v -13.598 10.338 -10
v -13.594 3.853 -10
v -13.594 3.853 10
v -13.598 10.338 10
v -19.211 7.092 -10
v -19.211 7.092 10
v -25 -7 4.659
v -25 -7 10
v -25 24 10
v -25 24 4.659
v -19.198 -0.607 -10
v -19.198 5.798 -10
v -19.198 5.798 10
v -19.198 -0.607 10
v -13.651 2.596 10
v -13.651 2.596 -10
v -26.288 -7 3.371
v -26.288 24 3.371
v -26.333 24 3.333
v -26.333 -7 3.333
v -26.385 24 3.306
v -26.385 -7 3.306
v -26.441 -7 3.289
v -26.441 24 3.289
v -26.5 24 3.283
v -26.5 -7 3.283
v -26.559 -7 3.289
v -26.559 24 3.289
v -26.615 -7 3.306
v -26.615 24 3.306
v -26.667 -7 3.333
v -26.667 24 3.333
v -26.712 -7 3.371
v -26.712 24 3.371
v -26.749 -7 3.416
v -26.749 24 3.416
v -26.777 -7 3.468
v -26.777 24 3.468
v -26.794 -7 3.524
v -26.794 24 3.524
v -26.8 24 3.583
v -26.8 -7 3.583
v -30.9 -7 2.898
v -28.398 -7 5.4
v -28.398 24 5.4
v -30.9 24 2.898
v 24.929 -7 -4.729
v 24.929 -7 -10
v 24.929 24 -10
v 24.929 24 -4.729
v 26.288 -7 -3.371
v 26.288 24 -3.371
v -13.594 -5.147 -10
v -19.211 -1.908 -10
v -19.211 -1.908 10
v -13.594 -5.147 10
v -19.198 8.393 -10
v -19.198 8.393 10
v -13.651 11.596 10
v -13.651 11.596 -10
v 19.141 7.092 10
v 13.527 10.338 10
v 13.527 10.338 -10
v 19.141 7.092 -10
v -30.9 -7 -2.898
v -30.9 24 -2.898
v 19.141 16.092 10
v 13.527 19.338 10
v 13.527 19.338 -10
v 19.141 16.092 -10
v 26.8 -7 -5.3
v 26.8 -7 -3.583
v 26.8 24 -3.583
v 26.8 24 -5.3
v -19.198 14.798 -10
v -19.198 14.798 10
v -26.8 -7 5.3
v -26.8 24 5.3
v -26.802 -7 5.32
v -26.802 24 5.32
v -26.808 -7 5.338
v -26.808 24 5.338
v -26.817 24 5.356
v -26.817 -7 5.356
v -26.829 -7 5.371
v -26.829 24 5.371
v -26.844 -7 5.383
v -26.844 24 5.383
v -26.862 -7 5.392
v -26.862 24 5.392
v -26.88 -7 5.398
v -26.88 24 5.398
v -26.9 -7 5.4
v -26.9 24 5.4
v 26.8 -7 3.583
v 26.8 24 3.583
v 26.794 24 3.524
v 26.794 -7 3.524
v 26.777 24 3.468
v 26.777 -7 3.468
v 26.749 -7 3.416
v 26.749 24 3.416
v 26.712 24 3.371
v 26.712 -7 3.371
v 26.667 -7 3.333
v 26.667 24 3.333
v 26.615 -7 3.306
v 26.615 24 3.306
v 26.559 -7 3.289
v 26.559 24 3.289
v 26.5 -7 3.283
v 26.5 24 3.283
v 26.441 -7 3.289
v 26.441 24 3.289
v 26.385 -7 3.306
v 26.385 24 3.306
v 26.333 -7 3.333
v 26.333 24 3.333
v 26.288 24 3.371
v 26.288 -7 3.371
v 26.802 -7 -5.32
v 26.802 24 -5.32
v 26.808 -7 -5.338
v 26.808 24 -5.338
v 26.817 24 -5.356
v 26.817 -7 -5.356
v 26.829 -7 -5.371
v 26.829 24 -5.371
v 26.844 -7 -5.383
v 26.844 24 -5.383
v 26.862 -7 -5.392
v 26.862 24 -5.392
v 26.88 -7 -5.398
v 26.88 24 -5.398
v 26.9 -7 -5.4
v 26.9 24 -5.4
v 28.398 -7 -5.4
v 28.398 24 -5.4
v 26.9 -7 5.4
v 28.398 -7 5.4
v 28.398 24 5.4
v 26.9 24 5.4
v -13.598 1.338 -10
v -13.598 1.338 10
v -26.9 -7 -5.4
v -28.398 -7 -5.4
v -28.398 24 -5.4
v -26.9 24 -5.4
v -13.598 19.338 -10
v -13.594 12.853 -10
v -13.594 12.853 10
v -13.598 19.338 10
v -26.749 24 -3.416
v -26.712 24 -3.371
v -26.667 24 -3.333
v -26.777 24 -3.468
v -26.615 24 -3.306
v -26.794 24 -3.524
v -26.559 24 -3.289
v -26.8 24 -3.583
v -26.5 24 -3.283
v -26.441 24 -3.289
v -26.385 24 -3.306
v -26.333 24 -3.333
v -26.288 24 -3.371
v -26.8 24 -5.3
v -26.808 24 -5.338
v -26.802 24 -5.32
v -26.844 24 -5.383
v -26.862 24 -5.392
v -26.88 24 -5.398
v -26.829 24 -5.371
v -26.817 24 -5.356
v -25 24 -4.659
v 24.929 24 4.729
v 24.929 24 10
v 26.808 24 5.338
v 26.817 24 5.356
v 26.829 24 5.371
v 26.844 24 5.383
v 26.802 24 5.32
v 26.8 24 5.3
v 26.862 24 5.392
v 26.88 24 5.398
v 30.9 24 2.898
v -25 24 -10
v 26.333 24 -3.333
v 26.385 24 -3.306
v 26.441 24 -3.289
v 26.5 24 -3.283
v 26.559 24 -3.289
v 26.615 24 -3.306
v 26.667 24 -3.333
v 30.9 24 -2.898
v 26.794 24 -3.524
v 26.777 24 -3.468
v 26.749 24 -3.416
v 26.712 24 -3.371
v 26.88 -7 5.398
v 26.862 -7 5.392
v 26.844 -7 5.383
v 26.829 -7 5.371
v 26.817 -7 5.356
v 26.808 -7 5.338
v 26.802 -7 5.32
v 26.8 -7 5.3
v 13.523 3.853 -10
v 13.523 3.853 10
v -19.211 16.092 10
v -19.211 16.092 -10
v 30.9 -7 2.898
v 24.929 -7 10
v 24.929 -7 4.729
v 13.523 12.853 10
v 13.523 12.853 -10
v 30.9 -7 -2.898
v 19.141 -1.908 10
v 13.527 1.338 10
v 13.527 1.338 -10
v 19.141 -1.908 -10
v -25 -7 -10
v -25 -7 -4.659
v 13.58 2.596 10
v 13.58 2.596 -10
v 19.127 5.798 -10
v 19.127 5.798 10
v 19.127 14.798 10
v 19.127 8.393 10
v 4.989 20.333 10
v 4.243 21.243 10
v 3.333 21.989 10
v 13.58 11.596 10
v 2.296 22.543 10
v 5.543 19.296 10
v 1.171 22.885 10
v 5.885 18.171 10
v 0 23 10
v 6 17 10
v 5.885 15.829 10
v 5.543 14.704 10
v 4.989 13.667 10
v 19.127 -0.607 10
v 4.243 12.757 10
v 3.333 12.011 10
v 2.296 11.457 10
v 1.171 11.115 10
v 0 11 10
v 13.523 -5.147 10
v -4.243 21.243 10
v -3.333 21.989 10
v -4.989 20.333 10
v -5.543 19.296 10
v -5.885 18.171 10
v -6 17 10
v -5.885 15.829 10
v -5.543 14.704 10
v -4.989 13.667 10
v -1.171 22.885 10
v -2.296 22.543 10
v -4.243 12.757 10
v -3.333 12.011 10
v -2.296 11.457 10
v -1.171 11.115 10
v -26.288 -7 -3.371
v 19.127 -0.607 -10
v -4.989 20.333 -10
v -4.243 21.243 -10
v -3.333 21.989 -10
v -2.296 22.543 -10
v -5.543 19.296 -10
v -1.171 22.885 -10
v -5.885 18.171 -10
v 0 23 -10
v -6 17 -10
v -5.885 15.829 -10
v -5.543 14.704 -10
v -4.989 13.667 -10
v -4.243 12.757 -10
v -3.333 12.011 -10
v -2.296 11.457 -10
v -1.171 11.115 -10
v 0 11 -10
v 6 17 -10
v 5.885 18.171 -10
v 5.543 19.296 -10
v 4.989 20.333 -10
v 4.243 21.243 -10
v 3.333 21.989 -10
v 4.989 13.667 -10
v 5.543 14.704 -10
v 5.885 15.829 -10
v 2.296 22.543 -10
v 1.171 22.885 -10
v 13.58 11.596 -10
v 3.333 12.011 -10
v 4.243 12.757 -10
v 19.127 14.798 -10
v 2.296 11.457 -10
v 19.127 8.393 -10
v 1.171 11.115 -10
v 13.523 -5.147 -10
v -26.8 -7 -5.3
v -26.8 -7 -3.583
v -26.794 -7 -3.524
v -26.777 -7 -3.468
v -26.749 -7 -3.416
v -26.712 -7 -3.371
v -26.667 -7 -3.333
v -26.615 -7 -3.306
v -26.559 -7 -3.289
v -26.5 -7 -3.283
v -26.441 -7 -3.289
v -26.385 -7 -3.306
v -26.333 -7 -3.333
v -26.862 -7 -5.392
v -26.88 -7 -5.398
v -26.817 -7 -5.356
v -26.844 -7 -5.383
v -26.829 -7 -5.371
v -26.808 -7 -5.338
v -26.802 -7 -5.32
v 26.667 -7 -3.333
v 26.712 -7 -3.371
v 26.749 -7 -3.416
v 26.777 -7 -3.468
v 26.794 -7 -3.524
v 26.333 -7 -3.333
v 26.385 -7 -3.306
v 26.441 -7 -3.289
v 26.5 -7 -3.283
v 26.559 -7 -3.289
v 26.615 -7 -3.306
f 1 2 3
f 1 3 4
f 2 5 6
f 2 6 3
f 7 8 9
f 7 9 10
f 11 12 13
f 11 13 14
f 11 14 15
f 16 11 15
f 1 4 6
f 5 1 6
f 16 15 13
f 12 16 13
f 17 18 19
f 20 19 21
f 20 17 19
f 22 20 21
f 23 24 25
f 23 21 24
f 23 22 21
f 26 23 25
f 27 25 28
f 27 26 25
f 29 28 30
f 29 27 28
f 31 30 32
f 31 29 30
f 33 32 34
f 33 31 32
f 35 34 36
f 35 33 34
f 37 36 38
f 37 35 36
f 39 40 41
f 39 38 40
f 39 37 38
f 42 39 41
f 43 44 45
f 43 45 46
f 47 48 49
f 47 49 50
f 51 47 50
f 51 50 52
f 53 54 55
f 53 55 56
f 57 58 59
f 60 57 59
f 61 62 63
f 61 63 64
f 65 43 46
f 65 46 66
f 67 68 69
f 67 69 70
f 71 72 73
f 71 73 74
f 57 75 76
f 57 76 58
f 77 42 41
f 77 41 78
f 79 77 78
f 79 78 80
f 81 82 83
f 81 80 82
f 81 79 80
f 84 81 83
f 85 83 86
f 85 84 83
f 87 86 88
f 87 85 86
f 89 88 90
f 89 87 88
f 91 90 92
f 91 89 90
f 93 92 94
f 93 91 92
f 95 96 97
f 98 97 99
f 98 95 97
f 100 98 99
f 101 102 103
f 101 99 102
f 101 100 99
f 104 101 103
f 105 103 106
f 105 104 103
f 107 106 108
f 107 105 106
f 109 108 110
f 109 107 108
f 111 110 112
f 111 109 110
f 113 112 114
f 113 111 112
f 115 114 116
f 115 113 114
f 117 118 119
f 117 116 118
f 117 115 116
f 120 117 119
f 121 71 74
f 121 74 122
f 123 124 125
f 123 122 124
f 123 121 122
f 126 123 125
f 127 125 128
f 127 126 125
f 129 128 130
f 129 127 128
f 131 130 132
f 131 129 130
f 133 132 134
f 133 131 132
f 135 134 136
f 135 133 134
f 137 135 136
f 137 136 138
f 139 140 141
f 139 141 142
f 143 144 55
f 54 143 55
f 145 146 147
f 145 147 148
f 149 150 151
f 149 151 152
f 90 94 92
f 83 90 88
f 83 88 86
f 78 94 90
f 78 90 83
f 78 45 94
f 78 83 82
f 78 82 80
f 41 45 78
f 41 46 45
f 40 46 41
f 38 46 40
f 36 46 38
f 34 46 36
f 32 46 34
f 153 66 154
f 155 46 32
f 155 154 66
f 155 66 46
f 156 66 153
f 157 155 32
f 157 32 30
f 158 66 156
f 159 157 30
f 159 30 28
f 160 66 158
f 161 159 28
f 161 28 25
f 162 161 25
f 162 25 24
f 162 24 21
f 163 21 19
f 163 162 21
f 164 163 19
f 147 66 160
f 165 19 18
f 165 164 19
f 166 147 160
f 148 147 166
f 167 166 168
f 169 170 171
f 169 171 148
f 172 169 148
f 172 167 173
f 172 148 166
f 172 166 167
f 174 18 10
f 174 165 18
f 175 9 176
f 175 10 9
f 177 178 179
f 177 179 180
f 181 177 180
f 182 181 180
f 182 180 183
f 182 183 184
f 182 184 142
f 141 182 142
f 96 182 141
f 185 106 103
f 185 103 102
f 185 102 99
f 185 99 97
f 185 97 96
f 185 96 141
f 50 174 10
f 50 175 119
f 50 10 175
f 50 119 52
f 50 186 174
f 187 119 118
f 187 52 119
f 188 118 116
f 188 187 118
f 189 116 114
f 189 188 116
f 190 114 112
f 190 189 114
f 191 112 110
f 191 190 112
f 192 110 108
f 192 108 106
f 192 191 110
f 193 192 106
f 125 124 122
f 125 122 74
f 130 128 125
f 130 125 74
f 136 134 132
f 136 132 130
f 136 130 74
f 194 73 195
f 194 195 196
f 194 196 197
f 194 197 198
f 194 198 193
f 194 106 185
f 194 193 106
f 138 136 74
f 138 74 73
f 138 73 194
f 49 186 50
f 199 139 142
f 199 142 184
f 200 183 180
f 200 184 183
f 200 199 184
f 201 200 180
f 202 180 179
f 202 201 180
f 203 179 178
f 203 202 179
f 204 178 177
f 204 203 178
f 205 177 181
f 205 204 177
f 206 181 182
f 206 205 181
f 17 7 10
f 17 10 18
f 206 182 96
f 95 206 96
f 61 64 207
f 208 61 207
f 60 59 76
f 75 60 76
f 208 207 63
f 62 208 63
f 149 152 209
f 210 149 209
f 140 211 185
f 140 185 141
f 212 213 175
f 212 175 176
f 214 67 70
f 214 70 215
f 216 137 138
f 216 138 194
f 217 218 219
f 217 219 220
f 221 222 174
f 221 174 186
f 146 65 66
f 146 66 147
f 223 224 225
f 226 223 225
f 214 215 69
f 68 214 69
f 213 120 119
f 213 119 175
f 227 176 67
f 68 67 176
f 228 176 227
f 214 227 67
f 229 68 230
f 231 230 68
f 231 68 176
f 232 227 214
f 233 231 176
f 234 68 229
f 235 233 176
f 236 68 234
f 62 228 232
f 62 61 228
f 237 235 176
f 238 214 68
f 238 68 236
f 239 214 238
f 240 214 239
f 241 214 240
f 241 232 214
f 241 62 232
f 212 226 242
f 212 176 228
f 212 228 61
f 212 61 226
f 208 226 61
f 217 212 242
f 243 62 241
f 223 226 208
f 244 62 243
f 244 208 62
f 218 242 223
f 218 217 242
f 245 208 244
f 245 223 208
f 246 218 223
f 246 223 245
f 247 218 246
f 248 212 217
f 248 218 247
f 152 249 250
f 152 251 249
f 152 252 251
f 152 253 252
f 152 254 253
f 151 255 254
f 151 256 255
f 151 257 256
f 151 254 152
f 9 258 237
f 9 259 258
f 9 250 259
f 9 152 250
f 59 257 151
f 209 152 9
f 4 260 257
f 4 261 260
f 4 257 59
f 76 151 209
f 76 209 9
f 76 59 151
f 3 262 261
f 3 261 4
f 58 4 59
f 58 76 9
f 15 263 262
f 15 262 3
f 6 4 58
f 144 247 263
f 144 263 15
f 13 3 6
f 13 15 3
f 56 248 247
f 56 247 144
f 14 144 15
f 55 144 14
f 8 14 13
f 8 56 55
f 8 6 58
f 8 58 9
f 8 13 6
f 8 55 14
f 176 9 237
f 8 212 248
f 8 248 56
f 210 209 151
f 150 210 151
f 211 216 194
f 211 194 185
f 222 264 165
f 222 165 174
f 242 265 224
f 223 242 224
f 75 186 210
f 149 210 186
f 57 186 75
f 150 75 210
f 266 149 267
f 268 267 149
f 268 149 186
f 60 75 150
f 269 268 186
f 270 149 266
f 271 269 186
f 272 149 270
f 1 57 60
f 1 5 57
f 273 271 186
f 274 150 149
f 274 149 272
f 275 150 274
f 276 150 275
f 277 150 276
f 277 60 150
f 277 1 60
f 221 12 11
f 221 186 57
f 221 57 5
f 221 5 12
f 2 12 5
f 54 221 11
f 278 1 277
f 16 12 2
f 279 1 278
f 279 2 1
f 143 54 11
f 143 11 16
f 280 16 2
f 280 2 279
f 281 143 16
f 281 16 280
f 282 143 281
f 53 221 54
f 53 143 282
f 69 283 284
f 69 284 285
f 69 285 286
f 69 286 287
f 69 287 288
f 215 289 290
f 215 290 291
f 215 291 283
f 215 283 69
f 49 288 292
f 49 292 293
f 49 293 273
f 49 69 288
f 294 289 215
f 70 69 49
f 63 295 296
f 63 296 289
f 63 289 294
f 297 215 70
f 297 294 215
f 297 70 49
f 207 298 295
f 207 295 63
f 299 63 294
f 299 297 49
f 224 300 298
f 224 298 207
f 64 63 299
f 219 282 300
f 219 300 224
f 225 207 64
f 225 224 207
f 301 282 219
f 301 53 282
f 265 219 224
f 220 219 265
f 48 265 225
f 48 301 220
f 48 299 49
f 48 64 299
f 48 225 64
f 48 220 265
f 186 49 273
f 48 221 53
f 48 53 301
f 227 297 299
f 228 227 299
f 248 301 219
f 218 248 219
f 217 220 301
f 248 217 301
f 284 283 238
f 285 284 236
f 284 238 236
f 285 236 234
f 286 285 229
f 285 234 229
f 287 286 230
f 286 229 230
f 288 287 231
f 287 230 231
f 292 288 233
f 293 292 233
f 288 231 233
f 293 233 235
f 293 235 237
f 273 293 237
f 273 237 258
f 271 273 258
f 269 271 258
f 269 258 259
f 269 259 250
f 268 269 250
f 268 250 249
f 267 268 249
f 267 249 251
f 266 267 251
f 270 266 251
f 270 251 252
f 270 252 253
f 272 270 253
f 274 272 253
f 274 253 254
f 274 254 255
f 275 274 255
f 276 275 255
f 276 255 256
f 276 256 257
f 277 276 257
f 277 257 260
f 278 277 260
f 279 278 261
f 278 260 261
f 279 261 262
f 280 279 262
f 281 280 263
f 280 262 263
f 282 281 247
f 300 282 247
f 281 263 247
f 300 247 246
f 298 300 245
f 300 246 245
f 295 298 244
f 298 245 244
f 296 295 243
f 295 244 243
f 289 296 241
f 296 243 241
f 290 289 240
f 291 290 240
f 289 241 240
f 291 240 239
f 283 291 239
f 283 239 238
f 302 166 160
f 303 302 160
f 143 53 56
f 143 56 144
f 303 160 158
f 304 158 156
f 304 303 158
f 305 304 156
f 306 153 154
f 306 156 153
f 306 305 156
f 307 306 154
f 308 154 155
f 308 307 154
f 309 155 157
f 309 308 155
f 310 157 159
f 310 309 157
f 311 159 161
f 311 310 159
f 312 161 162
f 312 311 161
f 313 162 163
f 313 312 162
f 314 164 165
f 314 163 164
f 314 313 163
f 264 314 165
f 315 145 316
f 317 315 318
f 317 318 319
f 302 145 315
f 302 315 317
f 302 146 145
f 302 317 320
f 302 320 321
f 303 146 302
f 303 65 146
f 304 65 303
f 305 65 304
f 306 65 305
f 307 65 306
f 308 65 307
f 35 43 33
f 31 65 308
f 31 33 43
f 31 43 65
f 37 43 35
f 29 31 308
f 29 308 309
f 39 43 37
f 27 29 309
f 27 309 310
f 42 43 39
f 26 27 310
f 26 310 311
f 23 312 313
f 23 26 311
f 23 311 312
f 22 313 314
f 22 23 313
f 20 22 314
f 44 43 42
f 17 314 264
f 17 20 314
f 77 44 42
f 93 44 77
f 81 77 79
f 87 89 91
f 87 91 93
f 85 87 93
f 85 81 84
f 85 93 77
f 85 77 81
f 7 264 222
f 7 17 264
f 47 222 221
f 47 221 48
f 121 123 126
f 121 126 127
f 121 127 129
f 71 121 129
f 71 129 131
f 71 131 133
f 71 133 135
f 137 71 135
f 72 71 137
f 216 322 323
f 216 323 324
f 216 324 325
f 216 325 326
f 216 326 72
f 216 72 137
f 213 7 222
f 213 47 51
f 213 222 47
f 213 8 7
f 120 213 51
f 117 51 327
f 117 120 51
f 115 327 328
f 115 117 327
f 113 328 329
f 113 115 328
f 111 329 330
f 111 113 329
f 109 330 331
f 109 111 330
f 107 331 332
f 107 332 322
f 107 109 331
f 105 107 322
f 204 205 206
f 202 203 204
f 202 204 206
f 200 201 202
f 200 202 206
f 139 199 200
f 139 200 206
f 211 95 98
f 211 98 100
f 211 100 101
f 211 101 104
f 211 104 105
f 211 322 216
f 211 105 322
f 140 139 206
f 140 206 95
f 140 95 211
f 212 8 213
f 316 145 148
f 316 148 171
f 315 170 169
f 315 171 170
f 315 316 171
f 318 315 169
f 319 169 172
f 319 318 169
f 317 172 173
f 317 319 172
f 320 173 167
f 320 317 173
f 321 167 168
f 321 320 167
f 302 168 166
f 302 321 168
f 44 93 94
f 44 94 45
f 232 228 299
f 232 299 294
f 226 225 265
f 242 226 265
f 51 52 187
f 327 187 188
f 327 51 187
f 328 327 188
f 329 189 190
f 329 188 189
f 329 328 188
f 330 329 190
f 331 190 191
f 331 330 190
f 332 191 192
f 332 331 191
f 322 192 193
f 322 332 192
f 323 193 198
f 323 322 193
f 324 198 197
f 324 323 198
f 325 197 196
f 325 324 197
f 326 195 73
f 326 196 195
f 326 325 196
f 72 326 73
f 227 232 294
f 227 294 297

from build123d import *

# Parameters (mm, degrees)
BOSS_EXTRU_1_DEPTH      = 24
ESQUISSE3_R             = 6
ENL_V_MAT_EXTRU_2_DEPTH = 44.940983148
BOSS_EXTRU_2_START      = 7
BOSS_EXTRU_2_DEPTH      = 7
ENL_V_MAT_EXTRU_3_DEPTH = 44.940983148


with BuildPart() as part:
    # Esquisse1 → Boss.-Extru.1 (new body)
    with BuildSketch(Plane(origin=(0, 0, 0), x_dir=(1, 0, 0), z_dir=(0, 1, 0))):
        with BuildLine():
            Line((-25, -4.8), (-25, -10))
            Line((-25, -10), (24.929289322, -10))
            Line((24.929289322, -10), (24.929289322, -4.729289322))
            Line((24.929289322, -4.729289322), (26.287867966, -3.370710678))
            ThreePointArc((26.287867966, -3.370710678), (26.61480503, -3.305678853), (26.8, -3.582842712))
            Line((26.8, -3.582842712), (26.8, -5.3))
            ThreePointArc((26.8, -5.3), (26.829289322, -5.370710678), (26.9, -5.4))
            Line((26.9, -5.4), (28.397918472, -5.4))
            Line((28.397918472, -5.4), (30.9, -2.897918472))
            Line((30.9, -2.897918472), (30.9, -0.241421356))
            Line((30.9, -0.241421356), (30.9, 0.241421356))
            Line((30.9, 0.241421356), (30.9, 2.897918472))
            Line((30.9, 2.897918472), (28.397918472, 5.4))
            Line((28.397918472, 5.4), (26.9, 5.4))
            ThreePointArc((26.9, 5.4), (26.829289322, 5.370710678), (26.8, 5.3))
            Line((26.8, 5.3), (26.8, 3.582842712))
            ThreePointArc((26.8, 3.582842712), (26.61480503, 3.305678853), (26.287867966, 3.370710678))
            Line((26.287867966, 3.370710678), (24.929289322, 4.729289322))
            Line((24.929289322, 4.729289322), (24.929289322, 10))
            Line((24.929289322, 10), (-25, 10))
            Line((-25, 10), (-25, 4.8))
            Line((-25, 4.8), (-25, 4.658578644))
            Line((-25, 4.658578644), (-26.287867966, 3.370710678))
            ThreePointArc((-26.287867966, 3.370710678), (-26.61480503, 3.305678853), (-26.8, 3.582842712))
            Line((-26.8, 3.582842712), (-26.8, 5.3))
            ThreePointArc((-26.8, 5.3), (-26.829289322, 5.370710678), (-26.9, 5.4))
            Line((-26.9, 5.4), (-28.397918472, 5.4))
            Line((-28.397918472, 5.4), (-30.9, 2.897918472))
            Line((-30.9, 2.897918472), (-30.9, 0.241421356))
            Line((-30.9, 0.241421356), (-30.9, -0.241421356))
            Line((-30.9, -0.241421356), (-30.9, -2.897918472))
            Line((-30.9, -2.897918472), (-28.397918472, -5.4))
            Line((-28.397918472, -5.4), (-26.9, -5.4))
            ThreePointArc((-26.9, -5.4), (-26.829289322, -5.370710678), (-26.8, -5.3))
            Line((-26.8, -5.3), (-26.8, -3.582842712))
            ThreePointArc((-26.8, -3.582842712), (-26.61480503, -3.305678853), (-26.287867966, -3.370710678))
            Line((-26.287867966, -3.370710678), (-25, -4.658578644))
            Line((-25, -4.658578644), (-25, -4.8))
        make_face()
    extrude(amount=BOSS_EXTRU_1_DEPTH)

    # Esquisse3 → Enlèv. mat.-Extru.2 (cut, through all)
    with BuildSketch(Plane.XY.offset(10)):
        with Locations((0, 17)):
            Circle(ESQUISSE3_R)
    extrude(amount=-ENL_V_MAT_EXTRU_2_DEPTH, mode=Mode.SUBTRACT)

    # Esquisse5 → Boss.-Extru.2 (add)
    with BuildSketch(Plane.XZ.offset(BOSS_EXTRU_2_START)):
        with BuildLine():
            Line((-25, -4.658578644), (-25, -10))
            Line((-25, -10), (24.929289322, -10))
            Line((24.929289322, -10), (24.929289322, -4.729289322))
            Line((24.929289322, -4.729289322), (26.287867966, -3.370710678))
            ThreePointArc((26.287867966, -3.370710678), (26.61480503, -3.305678853), (26.8, -3.582842712))
            Line((26.8, -3.582842712), (26.8, -5.3))
            ThreePointArc((26.8, -5.3), (26.829289322, -5.370710678), (26.9, -5.4))
            Line((26.9, -5.4), (28.397918472, -5.4))
            Line((28.397918472, -5.4), (30.9, -2.897918472))
            Line((30.9, -2.897918472), (30.9, 2.897918472))
            Line((30.9, 2.897918472), (28.397918472, 5.4))
            Line((28.397918472, 5.4), (26.9, 5.4))
            ThreePointArc((26.9, 5.4), (26.829289322, 5.370710678), (26.8, 5.3))
            Line((26.8, 5.3), (26.8, 3.582842712))
            ThreePointArc((26.8, 3.582842712), (26.61480503, 3.305678853), (26.287867966, 3.370710678))
            Line((26.287867966, 3.370710678), (24.929289322, 4.729289322))
            Line((24.929289322, 4.729289322), (24.929289322, 10))
            Line((24.929289322, 10), (-25, 10))
            Line((-25, 10), (-25, 4.658578644))
            Line((-25, 4.658578644), (-26.287867966, 3.370710678))
            ThreePointArc((-26.287867966, 3.370710678), (-26.61480503, 3.305678853), (-26.8, 3.582842712))
            Line((-26.8, 3.582842712), (-26.8, 5.3))
            ThreePointArc((-26.8, 5.3), (-26.829289322, 5.370710678), (-26.9, 5.4))
            Line((-26.9, 5.4), (-28.397918472, 5.4))
            Line((-28.397918472, 5.4), (-30.9, 2.897918472))
            Line((-30.9, 2.897918472), (-30.9, -2.897918472))
            Line((-30.9, -2.897918472), (-28.397918472, -5.4))
            Line((-28.397918472, -5.4), (-26.9, -5.4))
            ThreePointArc((-26.9, -5.4), (-26.829289322, -5.370710678), (-26.8, -5.3))
            Line((-26.8, -5.3), (-26.8, -3.582842712))
            ThreePointArc((-26.8, -3.582842712), (-26.61480503, -3.305678853), (-26.287867966, -3.370710678))
            Line((-26.287867966, -3.370710678), (-25, -4.658578644))
        make_face()
    extrude(amount=-BOSS_EXTRU_2_DEPTH)

    # Esquisse6 → Enlèv. mat.-Extru.3 (cut, through all)
    with BuildSketch(Plane.XY.offset(10)):
        Polygon((-19.197823099, 5.798124654), (-19.197823099, -0.606864634), (-13.650939664, 2.59563001), align=None)
        Polygon((-13.597630982, 10.337724739), (-19.211418501, 7.092391283), (-13.593983525, 3.853375408), align=None)
        Polygon((-19.211418501, -1.907608717), (-13.593983525, -5.146624592), (-13.597630982, 1.337724739), align=None)
        Polygon((-13.597630982, 19.337724739), (-19.211418501, 16.092391283), (-13.593983525, 12.853375408), align=None)
        Polygon((-19.197823099, 8.393135366), (-13.650939664, 11.59563001), (-19.197823099, 14.798124654), align=None)
        Polygon((19.12711242, -0.606864634), (13.580228986, 2.59563001), (19.12711242, 5.798124654), align=None)
        Polygon((19.12711242, 14.798124654), (19.12711242, 8.393135366), (13.580228986, 11.59563001), align=None)
        Polygon((13.523272847, 12.853375408), (13.526920304, 19.337724739), (19.140707823, 16.092391283), align=None)
        Polygon((13.523272847, 3.853375408), (13.526920304, 10.337724739), (19.140707823, 7.092391283), align=None)
        Polygon((13.526920304, 1.337724739), (19.140707823, -1.907608717), (13.523272847, -5.146624592), align=None)
    extrude(amount=-ENL_V_MAT_EXTRU_3_DEPTH, mode=Mode.SUBTRACT)


solid = part.part
